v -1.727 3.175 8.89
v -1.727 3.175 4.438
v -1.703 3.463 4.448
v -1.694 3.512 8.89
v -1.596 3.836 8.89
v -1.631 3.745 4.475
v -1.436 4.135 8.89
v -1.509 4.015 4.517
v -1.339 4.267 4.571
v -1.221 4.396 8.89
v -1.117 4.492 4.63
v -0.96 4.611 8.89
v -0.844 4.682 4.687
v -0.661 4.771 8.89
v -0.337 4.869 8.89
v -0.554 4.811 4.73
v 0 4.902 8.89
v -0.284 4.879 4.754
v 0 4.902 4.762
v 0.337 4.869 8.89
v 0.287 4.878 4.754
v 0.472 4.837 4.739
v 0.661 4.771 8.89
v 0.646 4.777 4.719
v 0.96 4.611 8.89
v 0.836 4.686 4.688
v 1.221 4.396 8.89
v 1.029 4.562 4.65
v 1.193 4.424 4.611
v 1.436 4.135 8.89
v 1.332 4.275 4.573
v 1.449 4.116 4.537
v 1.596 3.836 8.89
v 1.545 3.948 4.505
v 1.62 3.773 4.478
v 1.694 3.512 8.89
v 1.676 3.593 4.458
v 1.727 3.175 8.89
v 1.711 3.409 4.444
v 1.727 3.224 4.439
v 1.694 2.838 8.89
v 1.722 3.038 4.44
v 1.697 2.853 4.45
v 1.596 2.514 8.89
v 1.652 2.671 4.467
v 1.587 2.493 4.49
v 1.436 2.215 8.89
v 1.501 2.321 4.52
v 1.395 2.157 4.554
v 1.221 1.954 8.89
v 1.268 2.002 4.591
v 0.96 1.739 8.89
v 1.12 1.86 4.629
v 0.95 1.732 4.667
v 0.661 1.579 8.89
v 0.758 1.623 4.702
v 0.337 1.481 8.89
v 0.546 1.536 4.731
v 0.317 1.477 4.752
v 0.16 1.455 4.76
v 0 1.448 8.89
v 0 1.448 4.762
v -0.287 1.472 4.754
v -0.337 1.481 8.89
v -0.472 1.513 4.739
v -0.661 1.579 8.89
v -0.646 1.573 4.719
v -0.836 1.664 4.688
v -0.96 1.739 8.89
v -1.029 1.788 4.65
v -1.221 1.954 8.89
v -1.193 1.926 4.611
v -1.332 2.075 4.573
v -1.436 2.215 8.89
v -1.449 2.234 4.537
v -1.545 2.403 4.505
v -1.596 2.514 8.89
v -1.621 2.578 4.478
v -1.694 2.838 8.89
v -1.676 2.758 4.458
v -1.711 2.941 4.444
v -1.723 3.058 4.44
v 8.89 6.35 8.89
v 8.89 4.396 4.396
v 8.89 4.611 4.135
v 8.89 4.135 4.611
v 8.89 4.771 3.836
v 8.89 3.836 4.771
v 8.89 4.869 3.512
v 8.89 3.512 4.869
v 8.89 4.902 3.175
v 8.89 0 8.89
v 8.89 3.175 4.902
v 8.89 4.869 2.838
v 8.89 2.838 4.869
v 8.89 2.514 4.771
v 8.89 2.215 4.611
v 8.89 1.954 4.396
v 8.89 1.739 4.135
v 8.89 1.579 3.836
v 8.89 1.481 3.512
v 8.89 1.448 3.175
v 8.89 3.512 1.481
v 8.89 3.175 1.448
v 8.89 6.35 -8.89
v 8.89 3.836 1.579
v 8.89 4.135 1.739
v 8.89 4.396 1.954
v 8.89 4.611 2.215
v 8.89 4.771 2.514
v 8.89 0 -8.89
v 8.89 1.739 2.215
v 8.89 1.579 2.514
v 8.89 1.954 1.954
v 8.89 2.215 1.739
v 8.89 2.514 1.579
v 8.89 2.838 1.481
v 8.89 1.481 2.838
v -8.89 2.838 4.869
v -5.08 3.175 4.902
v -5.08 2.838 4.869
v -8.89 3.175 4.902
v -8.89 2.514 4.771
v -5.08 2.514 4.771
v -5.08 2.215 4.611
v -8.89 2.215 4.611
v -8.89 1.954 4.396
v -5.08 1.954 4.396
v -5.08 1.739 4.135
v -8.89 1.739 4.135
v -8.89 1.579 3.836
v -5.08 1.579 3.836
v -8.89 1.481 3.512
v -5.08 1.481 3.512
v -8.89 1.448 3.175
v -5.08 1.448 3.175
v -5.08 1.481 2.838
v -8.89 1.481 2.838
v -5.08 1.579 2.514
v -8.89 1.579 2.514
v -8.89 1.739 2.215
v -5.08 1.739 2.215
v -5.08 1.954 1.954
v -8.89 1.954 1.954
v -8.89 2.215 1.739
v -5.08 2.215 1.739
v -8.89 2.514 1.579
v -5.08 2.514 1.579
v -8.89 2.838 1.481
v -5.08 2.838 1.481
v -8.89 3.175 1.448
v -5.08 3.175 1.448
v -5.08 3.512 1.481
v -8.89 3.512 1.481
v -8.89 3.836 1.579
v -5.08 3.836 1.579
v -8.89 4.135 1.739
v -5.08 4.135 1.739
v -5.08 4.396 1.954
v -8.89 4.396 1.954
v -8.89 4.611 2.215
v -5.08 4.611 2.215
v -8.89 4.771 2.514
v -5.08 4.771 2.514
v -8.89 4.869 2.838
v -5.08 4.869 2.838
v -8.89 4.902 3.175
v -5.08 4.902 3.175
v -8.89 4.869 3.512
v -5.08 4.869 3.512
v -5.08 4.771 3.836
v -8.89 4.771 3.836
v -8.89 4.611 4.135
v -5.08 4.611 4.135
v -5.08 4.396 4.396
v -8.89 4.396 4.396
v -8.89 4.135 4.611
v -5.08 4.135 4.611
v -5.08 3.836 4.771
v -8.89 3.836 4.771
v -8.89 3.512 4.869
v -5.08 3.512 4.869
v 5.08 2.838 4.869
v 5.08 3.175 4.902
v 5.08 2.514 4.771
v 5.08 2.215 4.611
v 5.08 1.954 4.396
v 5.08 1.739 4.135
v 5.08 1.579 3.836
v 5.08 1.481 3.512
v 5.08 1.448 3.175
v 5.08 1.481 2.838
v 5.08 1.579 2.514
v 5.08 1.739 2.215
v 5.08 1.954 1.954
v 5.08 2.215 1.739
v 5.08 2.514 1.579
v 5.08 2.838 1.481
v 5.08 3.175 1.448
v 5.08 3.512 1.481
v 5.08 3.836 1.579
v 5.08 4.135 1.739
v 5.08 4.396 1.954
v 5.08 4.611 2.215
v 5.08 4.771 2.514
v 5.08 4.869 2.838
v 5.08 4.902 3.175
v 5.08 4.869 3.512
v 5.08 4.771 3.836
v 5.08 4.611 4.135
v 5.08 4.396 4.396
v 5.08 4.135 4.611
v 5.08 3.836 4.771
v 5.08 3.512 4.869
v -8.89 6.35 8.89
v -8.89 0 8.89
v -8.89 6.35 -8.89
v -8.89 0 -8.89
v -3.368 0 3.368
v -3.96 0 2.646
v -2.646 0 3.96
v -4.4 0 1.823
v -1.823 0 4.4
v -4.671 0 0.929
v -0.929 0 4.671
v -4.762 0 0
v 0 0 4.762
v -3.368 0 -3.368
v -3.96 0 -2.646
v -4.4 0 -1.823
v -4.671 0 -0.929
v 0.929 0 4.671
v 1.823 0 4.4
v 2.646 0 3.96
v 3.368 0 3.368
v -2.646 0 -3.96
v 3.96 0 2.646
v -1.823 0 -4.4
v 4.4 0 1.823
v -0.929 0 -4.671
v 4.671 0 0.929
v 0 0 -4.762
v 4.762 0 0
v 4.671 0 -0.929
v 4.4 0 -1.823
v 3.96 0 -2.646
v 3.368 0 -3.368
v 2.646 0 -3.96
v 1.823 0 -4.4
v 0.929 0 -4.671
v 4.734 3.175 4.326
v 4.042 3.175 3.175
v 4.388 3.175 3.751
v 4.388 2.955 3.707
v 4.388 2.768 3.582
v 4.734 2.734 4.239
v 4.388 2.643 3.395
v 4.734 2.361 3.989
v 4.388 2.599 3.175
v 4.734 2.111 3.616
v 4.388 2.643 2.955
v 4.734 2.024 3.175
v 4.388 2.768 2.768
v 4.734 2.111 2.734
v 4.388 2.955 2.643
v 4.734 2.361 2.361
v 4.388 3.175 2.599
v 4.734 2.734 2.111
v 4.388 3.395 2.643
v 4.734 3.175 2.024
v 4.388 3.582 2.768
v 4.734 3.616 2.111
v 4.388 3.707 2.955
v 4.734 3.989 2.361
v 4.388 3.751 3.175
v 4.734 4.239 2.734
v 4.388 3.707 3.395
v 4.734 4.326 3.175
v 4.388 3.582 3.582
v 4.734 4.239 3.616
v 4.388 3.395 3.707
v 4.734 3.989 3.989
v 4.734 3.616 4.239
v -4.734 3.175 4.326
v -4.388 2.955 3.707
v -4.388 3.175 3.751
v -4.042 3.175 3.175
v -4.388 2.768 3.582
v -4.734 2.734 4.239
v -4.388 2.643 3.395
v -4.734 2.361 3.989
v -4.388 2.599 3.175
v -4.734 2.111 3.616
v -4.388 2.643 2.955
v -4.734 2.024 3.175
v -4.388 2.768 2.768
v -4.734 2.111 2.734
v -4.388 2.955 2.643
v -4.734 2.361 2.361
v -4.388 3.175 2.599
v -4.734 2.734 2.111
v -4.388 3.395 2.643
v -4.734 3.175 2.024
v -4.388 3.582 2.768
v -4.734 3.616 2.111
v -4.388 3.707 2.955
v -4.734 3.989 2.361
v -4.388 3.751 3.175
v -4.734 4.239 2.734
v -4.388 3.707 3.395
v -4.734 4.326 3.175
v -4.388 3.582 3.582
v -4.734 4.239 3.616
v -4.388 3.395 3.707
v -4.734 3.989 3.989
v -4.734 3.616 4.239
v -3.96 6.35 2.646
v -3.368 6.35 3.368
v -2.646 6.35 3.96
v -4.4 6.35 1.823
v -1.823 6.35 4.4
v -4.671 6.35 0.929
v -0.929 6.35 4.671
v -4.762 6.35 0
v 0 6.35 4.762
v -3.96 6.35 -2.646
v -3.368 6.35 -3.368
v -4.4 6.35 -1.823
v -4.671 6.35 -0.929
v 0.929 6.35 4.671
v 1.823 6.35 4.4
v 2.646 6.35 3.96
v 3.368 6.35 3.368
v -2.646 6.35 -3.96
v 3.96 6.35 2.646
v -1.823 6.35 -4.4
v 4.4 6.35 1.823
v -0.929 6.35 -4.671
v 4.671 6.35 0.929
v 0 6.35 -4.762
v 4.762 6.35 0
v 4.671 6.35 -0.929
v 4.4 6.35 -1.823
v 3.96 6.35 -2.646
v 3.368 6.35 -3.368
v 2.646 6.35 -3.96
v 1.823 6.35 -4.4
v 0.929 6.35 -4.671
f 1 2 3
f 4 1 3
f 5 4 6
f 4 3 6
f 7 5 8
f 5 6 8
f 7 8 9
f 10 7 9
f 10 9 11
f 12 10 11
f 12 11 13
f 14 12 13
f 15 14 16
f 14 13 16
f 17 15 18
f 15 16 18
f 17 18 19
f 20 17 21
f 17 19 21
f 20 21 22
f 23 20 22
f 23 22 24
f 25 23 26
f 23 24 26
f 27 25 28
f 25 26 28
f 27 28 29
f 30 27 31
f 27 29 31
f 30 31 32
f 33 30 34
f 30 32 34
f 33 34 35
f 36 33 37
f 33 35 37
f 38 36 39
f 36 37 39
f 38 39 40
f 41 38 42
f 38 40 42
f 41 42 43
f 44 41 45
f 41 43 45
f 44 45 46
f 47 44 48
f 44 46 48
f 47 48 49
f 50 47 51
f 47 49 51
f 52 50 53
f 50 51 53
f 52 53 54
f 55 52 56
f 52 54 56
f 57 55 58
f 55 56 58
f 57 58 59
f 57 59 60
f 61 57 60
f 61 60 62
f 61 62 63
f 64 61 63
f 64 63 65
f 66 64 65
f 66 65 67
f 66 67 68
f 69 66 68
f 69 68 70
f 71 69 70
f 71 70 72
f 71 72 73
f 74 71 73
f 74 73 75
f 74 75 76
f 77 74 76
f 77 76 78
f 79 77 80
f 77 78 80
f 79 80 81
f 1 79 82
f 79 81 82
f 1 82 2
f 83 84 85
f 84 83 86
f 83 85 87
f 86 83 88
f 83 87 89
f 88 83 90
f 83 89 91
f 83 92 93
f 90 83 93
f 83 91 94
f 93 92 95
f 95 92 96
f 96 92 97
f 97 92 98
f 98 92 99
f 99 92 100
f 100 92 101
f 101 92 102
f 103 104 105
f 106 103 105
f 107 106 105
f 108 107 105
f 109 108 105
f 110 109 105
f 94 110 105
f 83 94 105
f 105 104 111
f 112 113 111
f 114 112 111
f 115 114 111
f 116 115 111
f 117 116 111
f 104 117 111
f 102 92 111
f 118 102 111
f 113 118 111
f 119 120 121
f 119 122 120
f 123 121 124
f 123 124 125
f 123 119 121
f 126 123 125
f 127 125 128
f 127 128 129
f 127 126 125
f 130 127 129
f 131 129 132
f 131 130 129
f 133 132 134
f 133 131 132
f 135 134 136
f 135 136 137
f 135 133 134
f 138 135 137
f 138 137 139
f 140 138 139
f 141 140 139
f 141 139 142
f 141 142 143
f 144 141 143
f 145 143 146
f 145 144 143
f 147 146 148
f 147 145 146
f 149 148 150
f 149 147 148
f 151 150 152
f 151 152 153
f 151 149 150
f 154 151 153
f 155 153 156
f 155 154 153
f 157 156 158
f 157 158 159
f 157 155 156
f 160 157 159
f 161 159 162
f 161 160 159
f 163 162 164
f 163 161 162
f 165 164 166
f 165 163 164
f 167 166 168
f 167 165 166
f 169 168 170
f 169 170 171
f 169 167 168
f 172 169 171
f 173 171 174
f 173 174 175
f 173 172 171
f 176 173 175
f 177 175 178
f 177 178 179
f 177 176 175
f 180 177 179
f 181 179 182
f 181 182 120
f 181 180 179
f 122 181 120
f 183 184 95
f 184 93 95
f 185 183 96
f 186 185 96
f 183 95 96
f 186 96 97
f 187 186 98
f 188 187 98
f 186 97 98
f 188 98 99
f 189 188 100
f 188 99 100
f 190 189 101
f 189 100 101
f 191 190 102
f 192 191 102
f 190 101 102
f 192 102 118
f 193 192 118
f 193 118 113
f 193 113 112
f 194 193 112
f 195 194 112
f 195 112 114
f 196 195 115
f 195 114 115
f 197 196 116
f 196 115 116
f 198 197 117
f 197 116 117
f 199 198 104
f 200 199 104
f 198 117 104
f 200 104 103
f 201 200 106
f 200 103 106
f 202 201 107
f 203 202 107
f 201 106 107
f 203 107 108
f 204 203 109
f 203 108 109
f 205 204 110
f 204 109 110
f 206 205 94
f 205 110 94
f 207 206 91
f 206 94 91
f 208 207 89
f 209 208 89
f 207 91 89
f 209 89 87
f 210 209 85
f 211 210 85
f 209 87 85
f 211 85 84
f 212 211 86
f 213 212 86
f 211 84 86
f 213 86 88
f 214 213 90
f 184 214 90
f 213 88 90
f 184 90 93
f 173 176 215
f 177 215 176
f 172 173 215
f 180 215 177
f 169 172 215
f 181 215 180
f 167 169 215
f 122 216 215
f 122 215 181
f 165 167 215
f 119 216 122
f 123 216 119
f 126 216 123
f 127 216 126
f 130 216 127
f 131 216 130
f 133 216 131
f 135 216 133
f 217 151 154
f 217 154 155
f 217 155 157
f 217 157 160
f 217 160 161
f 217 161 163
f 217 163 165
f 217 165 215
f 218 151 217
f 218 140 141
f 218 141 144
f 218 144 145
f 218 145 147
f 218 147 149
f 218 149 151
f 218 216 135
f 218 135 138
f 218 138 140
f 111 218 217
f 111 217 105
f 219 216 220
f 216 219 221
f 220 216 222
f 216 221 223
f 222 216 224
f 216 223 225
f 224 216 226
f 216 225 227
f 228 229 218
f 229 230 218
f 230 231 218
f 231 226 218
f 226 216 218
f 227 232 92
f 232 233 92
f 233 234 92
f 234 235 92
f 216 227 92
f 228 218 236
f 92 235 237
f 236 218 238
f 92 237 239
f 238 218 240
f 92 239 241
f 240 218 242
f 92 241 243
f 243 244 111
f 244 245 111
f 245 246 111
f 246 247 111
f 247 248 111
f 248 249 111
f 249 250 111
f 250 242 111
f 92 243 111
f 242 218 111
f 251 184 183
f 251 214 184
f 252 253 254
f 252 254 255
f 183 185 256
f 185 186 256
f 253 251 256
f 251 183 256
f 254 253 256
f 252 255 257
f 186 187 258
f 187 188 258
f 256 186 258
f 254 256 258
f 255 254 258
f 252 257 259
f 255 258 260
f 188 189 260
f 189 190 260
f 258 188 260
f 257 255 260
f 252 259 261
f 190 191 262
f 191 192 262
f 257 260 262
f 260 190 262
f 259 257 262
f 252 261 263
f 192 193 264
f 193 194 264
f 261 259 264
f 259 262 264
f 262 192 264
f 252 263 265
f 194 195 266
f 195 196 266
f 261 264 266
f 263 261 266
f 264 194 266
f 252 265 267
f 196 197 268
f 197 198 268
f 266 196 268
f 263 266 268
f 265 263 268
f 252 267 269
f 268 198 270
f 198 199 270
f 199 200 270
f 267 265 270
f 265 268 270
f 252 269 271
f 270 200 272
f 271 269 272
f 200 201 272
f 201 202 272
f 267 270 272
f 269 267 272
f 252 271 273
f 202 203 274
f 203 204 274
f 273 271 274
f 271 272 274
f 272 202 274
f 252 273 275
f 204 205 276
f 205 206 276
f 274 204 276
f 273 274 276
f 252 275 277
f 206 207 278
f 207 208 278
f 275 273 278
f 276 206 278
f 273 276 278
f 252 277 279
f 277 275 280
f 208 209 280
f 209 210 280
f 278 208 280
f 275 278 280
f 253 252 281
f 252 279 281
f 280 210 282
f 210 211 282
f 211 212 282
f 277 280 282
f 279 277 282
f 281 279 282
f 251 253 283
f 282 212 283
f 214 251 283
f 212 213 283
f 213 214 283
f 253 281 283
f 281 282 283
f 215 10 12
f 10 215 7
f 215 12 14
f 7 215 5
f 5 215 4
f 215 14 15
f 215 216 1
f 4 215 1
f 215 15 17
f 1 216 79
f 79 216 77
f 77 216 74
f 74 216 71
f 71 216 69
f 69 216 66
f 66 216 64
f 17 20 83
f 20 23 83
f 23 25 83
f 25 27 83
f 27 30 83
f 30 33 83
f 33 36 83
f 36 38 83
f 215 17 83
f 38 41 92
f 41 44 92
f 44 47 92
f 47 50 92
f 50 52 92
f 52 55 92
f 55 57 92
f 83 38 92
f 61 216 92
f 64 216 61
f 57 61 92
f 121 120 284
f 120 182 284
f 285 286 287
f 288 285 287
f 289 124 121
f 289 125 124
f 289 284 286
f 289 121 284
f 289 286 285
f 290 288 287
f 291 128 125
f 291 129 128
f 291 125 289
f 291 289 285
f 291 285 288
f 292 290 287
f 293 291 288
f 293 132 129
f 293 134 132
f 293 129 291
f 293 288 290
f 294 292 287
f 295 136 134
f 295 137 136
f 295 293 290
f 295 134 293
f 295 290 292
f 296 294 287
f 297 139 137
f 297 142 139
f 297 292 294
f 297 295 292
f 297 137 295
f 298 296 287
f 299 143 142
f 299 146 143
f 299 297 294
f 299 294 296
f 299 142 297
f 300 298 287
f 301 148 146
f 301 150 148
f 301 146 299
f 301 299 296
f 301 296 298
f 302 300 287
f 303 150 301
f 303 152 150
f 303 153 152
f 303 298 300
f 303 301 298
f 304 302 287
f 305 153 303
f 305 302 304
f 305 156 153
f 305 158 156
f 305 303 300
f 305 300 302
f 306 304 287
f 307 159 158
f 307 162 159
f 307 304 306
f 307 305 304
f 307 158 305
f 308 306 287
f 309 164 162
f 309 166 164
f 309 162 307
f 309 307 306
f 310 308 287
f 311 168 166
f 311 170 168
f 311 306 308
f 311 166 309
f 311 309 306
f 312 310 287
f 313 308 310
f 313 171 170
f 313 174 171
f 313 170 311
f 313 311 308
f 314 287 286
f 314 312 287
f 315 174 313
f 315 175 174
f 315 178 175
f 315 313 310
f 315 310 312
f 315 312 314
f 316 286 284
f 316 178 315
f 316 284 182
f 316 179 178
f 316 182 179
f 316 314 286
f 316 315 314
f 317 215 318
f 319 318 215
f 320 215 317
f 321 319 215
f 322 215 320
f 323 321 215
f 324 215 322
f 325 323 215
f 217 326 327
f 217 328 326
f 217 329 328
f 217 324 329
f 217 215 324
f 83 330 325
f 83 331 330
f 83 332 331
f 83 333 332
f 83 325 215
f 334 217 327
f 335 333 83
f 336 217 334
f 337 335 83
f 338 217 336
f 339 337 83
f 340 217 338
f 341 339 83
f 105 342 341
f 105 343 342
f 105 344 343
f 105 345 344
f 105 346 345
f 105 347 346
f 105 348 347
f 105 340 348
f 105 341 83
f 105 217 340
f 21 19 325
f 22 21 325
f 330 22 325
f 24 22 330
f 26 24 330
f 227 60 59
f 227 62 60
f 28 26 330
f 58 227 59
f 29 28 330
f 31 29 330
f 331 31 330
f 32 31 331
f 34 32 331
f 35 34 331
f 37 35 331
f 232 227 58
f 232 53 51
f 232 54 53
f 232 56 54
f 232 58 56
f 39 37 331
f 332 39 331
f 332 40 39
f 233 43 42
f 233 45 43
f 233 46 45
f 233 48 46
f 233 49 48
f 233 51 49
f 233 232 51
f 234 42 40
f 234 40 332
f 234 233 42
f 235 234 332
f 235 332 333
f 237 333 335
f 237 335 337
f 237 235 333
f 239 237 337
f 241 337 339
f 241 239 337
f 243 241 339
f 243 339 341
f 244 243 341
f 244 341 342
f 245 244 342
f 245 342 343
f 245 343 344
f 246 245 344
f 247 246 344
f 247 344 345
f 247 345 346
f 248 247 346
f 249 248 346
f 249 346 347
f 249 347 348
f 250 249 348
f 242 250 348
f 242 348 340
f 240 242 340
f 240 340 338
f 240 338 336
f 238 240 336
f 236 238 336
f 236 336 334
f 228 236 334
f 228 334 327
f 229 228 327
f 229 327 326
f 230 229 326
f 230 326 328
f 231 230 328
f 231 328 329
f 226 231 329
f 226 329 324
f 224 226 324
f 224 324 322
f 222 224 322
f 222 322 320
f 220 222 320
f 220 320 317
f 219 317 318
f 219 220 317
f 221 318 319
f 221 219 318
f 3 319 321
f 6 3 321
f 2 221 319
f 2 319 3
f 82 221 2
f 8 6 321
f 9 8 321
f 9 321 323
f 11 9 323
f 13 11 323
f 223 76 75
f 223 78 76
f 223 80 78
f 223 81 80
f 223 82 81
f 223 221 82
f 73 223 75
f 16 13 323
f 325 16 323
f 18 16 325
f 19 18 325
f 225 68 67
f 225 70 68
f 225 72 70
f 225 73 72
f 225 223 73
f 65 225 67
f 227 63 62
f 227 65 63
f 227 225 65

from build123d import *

# Parameters (mm, degrees)
SKETCH1_W                 = 17.78
SKETCH1_H                 = 17.78
SKETCH1_R                 = 4.7625
BOSS_EXTRUDE1_DEPTH       = 6.35
F_8_32_TAPPED_HOLE1_D     = 3.4544
F_8_32_TAPPED_HOLE1_DEPTH = 9.630193539
F_8_32_TAPPED_HOLE1_TIP   = 1.037806461


with BuildPart() as part:
    # Sketch1 → Boss-Extrude1 (new body)
    with BuildSketch(Plane(origin=(0, 0, 0), x_dir=(1, 0, 0), z_dir=(0, 1, 0))):
        Rectangle(SKETCH1_W, SKETCH1_H)
        with Locations(Location((0, 0, 0), (0, 0, 270))):
            Circle(SKETCH1_R, mode=Mode.SUBTRACT)
    extrude(amount=BOSS_EXTRUDE1_DEPTH)

    # #8-32 Tapped Hole1
    with Locations(Plane.XY.offset(8.89)):
        with Locations((0, 3.175)):
            Hole(F_8_32_TAPPED_HOLE1_D / 2, depth=F_8_32_TAPPED_HOLE1_DEPTH)
            with Locations((0, 0, -(F_8_32_TAPPED_HOLE1_DEPTH + F_8_32_TAPPED_HOLE1_TIP / 2))):  # 118° drill point
                Cone(0, F_8_32_TAPPED_HOLE1_D / 2, F_8_32_TAPPED_HOLE1_TIP, mode=Mode.SUBTRACT)

    # Sketch7 → #8-32 Tapped Hole2 (revolve, cut)
    with BuildSketch(Plane(origin=(-8.89, 3.175, 3.175), x_dir=(0, 0, 1), z_dir=(0, 1, 0))):
        Polygon((0, 0), (0, 4.847806461), (1.7272, 3.81), (1.7272, 0), align=None)
    f_8_32_tapped_hole2 = revolve(axis=Axis((-15.24, 3.175, 3.175), (1, 0, 0)), mode=Mode.SUBTRACT)

    # Mirror1: #8-32 Tapped Hole2 across plane
    add(f_8_32_tapped_hole2.mirror(Plane(origin=(0, 0, 0), x_dir=(0, 0, 1), z_dir=(1, 0, 0))), mode=Mode.SUBTRACT)


solid = part.part
